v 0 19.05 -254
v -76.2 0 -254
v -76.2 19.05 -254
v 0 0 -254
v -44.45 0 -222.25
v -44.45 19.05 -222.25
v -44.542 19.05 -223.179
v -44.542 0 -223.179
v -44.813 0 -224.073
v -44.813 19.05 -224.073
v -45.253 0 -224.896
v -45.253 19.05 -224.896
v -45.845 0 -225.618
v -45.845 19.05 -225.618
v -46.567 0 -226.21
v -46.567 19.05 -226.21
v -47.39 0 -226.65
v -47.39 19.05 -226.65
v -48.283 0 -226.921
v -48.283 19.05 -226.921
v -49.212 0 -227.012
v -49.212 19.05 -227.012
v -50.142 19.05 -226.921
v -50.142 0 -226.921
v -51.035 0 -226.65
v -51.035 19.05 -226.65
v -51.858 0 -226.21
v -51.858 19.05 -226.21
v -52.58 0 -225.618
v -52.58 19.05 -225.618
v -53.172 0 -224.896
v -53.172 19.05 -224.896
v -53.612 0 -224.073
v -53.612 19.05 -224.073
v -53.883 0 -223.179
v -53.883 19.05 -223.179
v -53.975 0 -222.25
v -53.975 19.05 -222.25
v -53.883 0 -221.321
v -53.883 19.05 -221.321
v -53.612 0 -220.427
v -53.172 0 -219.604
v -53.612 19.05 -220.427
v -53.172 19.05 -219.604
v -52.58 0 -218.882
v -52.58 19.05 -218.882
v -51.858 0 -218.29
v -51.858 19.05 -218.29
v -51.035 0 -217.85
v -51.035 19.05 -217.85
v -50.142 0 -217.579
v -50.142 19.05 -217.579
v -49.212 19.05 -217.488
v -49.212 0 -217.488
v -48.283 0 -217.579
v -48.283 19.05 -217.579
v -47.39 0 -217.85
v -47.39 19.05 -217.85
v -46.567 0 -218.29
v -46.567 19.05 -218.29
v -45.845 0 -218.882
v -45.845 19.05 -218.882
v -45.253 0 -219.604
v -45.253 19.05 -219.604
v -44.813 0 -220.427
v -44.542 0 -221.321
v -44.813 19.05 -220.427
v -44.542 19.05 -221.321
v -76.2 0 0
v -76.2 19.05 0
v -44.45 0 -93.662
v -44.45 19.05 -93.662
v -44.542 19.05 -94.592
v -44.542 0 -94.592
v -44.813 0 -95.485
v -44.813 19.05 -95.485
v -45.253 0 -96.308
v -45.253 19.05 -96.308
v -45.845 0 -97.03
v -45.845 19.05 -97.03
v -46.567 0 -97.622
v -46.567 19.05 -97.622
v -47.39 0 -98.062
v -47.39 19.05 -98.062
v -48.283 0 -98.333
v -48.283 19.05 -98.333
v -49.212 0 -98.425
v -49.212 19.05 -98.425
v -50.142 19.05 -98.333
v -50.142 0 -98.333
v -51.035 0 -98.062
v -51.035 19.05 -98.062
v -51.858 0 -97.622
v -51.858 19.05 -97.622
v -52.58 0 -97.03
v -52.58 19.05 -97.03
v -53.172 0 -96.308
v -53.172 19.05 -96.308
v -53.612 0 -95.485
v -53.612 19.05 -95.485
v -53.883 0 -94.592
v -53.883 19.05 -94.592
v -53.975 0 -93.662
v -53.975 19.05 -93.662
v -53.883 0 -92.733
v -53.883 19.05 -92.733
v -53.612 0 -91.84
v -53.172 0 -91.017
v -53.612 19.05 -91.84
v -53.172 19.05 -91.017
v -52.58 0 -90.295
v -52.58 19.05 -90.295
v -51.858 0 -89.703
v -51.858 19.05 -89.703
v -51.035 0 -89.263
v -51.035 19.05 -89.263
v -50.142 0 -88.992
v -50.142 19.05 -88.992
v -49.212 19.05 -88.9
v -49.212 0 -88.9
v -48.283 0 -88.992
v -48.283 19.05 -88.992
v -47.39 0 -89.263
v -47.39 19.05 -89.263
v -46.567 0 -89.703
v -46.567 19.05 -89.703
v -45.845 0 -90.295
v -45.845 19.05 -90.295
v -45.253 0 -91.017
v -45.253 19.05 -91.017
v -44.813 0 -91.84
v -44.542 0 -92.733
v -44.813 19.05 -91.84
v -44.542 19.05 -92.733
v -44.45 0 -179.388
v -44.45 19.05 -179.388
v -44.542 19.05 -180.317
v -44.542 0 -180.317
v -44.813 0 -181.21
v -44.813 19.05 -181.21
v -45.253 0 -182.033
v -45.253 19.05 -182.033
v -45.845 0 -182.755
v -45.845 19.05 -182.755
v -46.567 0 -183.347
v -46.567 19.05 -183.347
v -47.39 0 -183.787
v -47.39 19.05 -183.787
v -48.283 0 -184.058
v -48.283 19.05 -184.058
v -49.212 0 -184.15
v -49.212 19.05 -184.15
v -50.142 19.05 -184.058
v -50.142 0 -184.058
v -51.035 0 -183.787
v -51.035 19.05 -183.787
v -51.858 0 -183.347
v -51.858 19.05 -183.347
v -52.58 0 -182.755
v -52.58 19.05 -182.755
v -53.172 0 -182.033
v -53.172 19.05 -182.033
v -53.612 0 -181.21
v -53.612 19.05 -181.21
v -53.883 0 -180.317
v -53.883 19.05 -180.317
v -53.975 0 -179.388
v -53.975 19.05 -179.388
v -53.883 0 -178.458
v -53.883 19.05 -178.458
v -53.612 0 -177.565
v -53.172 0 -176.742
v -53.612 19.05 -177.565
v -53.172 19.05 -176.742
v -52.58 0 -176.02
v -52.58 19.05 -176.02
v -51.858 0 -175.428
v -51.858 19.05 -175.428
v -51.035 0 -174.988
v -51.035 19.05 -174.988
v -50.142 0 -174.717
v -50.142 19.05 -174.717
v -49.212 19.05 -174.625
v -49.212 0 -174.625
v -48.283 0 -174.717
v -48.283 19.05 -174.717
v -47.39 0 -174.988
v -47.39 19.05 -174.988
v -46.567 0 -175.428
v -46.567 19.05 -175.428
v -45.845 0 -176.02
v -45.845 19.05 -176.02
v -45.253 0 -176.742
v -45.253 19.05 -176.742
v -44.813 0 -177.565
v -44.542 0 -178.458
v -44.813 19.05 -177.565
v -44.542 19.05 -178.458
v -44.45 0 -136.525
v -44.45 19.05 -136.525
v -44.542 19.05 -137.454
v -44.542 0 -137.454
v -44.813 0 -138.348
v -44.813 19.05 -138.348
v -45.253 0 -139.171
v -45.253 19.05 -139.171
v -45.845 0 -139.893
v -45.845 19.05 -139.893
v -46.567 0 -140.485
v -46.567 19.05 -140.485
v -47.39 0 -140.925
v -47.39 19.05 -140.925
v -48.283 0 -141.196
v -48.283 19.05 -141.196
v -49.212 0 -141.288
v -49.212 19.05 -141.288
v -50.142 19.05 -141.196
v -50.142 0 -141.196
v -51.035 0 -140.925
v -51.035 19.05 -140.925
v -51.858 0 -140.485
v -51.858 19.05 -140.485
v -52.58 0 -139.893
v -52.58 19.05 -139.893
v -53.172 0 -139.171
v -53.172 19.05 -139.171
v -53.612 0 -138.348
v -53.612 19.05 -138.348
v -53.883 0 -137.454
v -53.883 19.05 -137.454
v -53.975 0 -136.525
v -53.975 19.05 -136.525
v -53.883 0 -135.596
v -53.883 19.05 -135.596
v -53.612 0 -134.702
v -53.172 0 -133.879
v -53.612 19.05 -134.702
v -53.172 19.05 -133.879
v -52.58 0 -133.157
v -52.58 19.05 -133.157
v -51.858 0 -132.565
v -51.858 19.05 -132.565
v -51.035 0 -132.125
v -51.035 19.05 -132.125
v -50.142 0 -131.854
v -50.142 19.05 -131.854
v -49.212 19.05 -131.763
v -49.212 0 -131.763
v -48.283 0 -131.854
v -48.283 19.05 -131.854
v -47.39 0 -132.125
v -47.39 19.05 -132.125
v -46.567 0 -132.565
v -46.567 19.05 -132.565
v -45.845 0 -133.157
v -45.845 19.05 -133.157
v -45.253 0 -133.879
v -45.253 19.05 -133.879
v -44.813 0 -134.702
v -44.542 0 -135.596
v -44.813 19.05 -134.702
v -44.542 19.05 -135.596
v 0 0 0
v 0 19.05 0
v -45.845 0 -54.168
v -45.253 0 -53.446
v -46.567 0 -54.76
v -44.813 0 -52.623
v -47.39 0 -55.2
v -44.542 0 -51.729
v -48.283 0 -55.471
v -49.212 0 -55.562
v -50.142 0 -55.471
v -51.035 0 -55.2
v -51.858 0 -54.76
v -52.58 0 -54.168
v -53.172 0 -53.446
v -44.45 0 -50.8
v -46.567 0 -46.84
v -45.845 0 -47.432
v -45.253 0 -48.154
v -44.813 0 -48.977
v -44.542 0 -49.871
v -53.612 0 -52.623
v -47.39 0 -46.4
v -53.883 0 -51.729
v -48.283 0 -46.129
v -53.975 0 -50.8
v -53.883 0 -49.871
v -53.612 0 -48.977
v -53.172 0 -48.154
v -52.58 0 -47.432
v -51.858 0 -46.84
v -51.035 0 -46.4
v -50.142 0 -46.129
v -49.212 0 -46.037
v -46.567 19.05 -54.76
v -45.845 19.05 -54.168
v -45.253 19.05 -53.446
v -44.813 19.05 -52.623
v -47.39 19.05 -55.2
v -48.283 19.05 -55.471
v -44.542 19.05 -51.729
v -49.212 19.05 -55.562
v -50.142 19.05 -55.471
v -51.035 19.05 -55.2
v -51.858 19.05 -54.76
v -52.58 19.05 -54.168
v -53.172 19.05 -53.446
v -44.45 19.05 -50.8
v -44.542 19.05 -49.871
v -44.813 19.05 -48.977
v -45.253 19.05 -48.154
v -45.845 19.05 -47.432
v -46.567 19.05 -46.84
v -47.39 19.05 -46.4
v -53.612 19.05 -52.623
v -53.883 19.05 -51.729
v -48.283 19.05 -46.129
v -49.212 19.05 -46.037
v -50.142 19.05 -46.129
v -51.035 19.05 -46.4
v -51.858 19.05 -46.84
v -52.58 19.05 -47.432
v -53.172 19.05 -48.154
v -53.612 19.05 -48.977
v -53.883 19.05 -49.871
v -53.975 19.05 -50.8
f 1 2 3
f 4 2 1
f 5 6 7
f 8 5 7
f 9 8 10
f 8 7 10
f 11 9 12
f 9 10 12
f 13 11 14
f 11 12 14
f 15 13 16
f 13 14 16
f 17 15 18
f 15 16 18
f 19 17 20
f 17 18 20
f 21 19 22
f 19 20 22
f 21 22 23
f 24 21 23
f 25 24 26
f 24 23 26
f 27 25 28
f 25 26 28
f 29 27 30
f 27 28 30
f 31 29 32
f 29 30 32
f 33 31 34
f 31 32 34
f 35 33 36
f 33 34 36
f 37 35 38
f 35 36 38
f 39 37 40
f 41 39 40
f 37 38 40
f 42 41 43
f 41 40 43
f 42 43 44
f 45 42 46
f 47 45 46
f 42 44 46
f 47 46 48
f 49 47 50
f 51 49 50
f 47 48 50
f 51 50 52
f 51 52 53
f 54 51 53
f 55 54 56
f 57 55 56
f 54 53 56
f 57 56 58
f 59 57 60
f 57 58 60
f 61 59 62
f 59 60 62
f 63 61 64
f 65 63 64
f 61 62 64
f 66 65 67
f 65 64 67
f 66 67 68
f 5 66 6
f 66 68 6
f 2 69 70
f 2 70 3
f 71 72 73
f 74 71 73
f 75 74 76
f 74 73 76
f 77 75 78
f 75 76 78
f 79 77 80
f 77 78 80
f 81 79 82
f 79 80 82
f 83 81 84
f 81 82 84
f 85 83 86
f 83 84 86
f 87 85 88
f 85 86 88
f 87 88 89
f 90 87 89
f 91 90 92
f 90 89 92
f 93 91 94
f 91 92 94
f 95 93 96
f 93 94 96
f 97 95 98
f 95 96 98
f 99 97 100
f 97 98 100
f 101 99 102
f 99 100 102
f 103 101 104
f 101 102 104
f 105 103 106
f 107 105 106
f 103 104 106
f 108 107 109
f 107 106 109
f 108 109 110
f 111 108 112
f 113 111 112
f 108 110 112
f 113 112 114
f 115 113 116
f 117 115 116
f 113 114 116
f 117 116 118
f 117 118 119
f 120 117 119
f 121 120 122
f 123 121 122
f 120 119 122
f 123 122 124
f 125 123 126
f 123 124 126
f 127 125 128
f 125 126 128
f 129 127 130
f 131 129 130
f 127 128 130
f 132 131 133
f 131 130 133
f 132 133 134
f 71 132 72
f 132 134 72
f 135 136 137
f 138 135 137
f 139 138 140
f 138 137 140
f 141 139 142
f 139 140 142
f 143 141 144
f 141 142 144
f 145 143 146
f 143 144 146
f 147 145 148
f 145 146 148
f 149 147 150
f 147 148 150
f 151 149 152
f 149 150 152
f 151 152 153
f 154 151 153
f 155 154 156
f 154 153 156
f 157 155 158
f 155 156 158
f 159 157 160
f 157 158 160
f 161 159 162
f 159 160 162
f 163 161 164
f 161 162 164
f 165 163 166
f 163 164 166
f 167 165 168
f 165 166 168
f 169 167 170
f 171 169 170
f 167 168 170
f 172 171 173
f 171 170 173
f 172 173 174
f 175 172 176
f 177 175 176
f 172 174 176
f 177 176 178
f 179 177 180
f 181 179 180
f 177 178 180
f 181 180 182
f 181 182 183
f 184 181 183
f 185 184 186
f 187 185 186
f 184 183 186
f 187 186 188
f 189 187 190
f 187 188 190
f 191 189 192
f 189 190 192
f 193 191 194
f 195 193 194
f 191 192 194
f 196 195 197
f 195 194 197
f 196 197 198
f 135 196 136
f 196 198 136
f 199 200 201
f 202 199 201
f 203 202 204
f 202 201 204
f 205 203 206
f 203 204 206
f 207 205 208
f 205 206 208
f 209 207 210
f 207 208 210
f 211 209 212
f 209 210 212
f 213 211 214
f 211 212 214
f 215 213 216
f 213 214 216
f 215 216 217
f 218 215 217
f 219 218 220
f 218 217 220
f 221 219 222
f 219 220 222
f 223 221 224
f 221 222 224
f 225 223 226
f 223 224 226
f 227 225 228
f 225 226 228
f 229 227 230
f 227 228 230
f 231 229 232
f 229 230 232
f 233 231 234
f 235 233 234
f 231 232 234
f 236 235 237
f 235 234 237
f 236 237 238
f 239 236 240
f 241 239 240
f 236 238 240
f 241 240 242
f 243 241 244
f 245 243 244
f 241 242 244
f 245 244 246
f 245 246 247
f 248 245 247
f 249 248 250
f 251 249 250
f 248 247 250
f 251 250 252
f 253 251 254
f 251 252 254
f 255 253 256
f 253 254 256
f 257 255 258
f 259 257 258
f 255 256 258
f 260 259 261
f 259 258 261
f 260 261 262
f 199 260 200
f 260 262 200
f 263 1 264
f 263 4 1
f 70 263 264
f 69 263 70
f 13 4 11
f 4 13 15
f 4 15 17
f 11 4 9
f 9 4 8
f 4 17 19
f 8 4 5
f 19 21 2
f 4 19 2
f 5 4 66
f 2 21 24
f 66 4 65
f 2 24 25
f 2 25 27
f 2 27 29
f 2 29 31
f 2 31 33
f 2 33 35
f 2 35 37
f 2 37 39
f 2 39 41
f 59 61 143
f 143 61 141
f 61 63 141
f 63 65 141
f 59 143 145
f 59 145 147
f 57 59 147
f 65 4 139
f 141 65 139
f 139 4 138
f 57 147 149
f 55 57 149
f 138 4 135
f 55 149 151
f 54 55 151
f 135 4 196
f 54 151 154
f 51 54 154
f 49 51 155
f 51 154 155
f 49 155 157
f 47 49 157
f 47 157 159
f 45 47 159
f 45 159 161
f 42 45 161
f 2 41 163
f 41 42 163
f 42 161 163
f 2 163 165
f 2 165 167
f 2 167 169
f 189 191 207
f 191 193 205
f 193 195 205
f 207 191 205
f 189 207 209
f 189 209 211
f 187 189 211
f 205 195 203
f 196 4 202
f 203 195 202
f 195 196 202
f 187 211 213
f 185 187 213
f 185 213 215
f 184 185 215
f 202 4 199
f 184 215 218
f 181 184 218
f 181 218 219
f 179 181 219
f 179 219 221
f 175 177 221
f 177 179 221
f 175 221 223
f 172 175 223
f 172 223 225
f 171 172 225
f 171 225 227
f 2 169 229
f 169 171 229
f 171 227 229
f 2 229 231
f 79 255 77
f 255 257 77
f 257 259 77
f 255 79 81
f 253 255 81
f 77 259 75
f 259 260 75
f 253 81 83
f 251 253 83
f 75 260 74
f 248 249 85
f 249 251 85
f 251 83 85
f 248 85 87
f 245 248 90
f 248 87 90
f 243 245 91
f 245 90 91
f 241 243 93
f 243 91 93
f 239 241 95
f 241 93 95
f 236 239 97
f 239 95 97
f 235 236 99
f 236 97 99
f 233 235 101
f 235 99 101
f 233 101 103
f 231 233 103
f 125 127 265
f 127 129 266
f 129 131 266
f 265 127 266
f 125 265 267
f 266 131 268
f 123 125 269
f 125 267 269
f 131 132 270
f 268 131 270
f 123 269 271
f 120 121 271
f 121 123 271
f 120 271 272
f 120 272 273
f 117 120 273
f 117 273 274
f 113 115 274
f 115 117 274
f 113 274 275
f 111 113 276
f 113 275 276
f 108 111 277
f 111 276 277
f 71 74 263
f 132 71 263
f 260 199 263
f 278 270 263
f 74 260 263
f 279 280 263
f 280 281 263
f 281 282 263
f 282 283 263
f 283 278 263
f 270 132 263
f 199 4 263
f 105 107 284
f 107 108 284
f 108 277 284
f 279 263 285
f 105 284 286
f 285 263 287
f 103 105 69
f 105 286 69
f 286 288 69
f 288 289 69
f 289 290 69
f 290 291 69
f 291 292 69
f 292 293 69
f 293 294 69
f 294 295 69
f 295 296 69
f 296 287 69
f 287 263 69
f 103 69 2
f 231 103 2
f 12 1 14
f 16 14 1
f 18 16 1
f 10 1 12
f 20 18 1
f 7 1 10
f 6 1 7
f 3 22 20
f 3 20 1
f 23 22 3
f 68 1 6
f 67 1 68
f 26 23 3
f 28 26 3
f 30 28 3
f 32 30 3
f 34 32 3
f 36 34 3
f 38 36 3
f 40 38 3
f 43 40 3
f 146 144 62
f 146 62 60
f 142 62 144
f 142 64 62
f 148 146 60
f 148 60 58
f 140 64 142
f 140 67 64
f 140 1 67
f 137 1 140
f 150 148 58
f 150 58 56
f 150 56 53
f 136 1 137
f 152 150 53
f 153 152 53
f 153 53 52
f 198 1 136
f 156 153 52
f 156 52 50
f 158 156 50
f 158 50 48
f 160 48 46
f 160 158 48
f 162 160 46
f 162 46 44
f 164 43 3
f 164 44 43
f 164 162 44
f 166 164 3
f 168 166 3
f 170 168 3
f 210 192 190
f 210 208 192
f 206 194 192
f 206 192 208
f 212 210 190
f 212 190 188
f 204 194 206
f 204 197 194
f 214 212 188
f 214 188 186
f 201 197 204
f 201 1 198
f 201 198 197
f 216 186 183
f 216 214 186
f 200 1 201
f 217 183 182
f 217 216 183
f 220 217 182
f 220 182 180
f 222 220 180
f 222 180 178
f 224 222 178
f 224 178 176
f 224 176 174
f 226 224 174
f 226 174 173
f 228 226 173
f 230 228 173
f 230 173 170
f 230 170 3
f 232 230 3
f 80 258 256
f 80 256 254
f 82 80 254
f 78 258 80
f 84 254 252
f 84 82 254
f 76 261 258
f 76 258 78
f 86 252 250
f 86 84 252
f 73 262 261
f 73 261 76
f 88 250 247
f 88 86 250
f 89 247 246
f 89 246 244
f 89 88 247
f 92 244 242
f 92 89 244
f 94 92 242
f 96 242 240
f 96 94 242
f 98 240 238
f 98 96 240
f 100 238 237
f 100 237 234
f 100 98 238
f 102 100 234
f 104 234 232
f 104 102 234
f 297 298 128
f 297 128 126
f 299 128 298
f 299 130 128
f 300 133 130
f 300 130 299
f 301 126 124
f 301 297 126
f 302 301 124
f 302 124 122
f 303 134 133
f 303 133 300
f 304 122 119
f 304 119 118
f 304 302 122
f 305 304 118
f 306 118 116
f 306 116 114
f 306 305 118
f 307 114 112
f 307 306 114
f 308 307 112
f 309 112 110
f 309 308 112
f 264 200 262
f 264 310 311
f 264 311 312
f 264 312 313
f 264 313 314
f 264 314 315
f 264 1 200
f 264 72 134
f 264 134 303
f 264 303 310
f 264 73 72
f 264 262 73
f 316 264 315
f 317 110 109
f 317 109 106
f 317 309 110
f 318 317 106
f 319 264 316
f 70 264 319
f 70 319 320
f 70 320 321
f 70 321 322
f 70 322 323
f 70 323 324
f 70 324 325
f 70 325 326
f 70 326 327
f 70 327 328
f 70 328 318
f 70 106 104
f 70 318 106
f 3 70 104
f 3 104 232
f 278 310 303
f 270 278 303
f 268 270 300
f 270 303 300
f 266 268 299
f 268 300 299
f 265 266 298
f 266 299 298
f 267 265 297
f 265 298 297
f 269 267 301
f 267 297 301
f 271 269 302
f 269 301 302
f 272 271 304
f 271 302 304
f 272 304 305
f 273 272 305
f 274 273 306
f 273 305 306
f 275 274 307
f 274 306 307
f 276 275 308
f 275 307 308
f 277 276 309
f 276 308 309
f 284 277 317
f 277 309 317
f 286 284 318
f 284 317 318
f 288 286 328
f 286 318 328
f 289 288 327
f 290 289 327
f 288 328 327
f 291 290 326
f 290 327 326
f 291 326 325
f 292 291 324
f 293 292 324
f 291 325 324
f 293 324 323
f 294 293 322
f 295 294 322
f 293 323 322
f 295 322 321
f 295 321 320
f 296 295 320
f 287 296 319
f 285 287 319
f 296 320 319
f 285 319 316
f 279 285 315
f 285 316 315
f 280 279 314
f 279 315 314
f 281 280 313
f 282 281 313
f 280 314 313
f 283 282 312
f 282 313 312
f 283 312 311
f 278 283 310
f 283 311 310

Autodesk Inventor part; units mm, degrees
ref_plane "YZ Plane" through (0, 0, 0) normal (1, 0, 0) x (0, 1, 0)
ref_plane "XZ Plane" through (0, 0, 0) normal (0, 1, 0) x (-1, 0, 0)
ref_plane "XY Plane" through (0, 0, 0) normal (0, 0, 1) x (1, 0, 0)
sketch "Sketch1" plane through (0, 0, 0) normal (0, 1, 0) x (-1, 0, 0)
  line L0 (0, 0) -> (76.2, 0)
  line L1 (76.2, 0) -> (76.2, -254)
  line L2 (76.2, -254) -> (0, -254)
  line L3 (0, -254) -> (0, 0)
  dimension "d0" = 254
  dimension "d1" = 76.2
extrude "Extrusion1" add sketch "Sketch1" along normal blind 19.05
sketch "Sketch2" plane through (0, 19.05, 0) normal (0, 1, 0) x (1, 0, 0)
  line L0 (-76.2, 0) -> (0, 0) projected
  line L1 (-49.2125, 0) -> (-49.2125, 850.9)
  line L2 (0, 0) -> (0, 254) projected
  line L3 (-76.2, 254) -> (-76.2, 0) projected
  circle A0 centre (-49.2125, 50.8) radius 4.7625
  circle A1 centre (-49.2125, 93.6625) radius 4.7625
  circle A2 centre (-49.2125, 136.525) radius 4.7625
  circle A3 centre (-49.2125, 179.3875) radius 4.7625
  circle A4 centre (-49.2125, 222.25) radius 4.7625
  dimension "d4" = 26.9875
  dimension "d5" = 50.8
  dimension "d6" = 9.525
  dimension "d7" = 42.8625
  dimension "d8" = 42.8625
  dimension "d9" = 42.8625
  dimension "d10" = 42.8625
extrude "Extrusion2" cut sketch "Sketch2" against normal up to surface (19.05 mm away)
equation "\"d0\" = botPlateLength"
equation "\"d1\" = botPlateWidth"
equation "\"d2\" = woodThickness"
equation "\"d4\" = tuningPegOffset"
equation "\"d5\" = tuningPegEndOffset"
equation "\"d6\" = tuningPegDiameter"
equation "\"d7\" = tuningPegSeparation"
equation "\"d8\" = tuningPegSeparation"
equation "\"d9\" = tuningPegSeparation"
equation "\"d10\" = tuningPegSeparation"
equation "\"botPlateWidth\" = 76.2"
equation "\"woodThickness\" = 19.05"
equation "\"stringLength\" = 647.7"
equation "\"neckLength\" = 203.2"
equation "\"tuningPegOffset\" = 26.9875"
equation "\"tuningPegDiameter\" = 9.525"
equation "\"tuningPegEndOffset\" = 50.8"
equation "\"botPlateLength\" = 254"
equation "\"tuningPegSeparation\" = 42.8625"
properties part number "bodyBotPlate"
